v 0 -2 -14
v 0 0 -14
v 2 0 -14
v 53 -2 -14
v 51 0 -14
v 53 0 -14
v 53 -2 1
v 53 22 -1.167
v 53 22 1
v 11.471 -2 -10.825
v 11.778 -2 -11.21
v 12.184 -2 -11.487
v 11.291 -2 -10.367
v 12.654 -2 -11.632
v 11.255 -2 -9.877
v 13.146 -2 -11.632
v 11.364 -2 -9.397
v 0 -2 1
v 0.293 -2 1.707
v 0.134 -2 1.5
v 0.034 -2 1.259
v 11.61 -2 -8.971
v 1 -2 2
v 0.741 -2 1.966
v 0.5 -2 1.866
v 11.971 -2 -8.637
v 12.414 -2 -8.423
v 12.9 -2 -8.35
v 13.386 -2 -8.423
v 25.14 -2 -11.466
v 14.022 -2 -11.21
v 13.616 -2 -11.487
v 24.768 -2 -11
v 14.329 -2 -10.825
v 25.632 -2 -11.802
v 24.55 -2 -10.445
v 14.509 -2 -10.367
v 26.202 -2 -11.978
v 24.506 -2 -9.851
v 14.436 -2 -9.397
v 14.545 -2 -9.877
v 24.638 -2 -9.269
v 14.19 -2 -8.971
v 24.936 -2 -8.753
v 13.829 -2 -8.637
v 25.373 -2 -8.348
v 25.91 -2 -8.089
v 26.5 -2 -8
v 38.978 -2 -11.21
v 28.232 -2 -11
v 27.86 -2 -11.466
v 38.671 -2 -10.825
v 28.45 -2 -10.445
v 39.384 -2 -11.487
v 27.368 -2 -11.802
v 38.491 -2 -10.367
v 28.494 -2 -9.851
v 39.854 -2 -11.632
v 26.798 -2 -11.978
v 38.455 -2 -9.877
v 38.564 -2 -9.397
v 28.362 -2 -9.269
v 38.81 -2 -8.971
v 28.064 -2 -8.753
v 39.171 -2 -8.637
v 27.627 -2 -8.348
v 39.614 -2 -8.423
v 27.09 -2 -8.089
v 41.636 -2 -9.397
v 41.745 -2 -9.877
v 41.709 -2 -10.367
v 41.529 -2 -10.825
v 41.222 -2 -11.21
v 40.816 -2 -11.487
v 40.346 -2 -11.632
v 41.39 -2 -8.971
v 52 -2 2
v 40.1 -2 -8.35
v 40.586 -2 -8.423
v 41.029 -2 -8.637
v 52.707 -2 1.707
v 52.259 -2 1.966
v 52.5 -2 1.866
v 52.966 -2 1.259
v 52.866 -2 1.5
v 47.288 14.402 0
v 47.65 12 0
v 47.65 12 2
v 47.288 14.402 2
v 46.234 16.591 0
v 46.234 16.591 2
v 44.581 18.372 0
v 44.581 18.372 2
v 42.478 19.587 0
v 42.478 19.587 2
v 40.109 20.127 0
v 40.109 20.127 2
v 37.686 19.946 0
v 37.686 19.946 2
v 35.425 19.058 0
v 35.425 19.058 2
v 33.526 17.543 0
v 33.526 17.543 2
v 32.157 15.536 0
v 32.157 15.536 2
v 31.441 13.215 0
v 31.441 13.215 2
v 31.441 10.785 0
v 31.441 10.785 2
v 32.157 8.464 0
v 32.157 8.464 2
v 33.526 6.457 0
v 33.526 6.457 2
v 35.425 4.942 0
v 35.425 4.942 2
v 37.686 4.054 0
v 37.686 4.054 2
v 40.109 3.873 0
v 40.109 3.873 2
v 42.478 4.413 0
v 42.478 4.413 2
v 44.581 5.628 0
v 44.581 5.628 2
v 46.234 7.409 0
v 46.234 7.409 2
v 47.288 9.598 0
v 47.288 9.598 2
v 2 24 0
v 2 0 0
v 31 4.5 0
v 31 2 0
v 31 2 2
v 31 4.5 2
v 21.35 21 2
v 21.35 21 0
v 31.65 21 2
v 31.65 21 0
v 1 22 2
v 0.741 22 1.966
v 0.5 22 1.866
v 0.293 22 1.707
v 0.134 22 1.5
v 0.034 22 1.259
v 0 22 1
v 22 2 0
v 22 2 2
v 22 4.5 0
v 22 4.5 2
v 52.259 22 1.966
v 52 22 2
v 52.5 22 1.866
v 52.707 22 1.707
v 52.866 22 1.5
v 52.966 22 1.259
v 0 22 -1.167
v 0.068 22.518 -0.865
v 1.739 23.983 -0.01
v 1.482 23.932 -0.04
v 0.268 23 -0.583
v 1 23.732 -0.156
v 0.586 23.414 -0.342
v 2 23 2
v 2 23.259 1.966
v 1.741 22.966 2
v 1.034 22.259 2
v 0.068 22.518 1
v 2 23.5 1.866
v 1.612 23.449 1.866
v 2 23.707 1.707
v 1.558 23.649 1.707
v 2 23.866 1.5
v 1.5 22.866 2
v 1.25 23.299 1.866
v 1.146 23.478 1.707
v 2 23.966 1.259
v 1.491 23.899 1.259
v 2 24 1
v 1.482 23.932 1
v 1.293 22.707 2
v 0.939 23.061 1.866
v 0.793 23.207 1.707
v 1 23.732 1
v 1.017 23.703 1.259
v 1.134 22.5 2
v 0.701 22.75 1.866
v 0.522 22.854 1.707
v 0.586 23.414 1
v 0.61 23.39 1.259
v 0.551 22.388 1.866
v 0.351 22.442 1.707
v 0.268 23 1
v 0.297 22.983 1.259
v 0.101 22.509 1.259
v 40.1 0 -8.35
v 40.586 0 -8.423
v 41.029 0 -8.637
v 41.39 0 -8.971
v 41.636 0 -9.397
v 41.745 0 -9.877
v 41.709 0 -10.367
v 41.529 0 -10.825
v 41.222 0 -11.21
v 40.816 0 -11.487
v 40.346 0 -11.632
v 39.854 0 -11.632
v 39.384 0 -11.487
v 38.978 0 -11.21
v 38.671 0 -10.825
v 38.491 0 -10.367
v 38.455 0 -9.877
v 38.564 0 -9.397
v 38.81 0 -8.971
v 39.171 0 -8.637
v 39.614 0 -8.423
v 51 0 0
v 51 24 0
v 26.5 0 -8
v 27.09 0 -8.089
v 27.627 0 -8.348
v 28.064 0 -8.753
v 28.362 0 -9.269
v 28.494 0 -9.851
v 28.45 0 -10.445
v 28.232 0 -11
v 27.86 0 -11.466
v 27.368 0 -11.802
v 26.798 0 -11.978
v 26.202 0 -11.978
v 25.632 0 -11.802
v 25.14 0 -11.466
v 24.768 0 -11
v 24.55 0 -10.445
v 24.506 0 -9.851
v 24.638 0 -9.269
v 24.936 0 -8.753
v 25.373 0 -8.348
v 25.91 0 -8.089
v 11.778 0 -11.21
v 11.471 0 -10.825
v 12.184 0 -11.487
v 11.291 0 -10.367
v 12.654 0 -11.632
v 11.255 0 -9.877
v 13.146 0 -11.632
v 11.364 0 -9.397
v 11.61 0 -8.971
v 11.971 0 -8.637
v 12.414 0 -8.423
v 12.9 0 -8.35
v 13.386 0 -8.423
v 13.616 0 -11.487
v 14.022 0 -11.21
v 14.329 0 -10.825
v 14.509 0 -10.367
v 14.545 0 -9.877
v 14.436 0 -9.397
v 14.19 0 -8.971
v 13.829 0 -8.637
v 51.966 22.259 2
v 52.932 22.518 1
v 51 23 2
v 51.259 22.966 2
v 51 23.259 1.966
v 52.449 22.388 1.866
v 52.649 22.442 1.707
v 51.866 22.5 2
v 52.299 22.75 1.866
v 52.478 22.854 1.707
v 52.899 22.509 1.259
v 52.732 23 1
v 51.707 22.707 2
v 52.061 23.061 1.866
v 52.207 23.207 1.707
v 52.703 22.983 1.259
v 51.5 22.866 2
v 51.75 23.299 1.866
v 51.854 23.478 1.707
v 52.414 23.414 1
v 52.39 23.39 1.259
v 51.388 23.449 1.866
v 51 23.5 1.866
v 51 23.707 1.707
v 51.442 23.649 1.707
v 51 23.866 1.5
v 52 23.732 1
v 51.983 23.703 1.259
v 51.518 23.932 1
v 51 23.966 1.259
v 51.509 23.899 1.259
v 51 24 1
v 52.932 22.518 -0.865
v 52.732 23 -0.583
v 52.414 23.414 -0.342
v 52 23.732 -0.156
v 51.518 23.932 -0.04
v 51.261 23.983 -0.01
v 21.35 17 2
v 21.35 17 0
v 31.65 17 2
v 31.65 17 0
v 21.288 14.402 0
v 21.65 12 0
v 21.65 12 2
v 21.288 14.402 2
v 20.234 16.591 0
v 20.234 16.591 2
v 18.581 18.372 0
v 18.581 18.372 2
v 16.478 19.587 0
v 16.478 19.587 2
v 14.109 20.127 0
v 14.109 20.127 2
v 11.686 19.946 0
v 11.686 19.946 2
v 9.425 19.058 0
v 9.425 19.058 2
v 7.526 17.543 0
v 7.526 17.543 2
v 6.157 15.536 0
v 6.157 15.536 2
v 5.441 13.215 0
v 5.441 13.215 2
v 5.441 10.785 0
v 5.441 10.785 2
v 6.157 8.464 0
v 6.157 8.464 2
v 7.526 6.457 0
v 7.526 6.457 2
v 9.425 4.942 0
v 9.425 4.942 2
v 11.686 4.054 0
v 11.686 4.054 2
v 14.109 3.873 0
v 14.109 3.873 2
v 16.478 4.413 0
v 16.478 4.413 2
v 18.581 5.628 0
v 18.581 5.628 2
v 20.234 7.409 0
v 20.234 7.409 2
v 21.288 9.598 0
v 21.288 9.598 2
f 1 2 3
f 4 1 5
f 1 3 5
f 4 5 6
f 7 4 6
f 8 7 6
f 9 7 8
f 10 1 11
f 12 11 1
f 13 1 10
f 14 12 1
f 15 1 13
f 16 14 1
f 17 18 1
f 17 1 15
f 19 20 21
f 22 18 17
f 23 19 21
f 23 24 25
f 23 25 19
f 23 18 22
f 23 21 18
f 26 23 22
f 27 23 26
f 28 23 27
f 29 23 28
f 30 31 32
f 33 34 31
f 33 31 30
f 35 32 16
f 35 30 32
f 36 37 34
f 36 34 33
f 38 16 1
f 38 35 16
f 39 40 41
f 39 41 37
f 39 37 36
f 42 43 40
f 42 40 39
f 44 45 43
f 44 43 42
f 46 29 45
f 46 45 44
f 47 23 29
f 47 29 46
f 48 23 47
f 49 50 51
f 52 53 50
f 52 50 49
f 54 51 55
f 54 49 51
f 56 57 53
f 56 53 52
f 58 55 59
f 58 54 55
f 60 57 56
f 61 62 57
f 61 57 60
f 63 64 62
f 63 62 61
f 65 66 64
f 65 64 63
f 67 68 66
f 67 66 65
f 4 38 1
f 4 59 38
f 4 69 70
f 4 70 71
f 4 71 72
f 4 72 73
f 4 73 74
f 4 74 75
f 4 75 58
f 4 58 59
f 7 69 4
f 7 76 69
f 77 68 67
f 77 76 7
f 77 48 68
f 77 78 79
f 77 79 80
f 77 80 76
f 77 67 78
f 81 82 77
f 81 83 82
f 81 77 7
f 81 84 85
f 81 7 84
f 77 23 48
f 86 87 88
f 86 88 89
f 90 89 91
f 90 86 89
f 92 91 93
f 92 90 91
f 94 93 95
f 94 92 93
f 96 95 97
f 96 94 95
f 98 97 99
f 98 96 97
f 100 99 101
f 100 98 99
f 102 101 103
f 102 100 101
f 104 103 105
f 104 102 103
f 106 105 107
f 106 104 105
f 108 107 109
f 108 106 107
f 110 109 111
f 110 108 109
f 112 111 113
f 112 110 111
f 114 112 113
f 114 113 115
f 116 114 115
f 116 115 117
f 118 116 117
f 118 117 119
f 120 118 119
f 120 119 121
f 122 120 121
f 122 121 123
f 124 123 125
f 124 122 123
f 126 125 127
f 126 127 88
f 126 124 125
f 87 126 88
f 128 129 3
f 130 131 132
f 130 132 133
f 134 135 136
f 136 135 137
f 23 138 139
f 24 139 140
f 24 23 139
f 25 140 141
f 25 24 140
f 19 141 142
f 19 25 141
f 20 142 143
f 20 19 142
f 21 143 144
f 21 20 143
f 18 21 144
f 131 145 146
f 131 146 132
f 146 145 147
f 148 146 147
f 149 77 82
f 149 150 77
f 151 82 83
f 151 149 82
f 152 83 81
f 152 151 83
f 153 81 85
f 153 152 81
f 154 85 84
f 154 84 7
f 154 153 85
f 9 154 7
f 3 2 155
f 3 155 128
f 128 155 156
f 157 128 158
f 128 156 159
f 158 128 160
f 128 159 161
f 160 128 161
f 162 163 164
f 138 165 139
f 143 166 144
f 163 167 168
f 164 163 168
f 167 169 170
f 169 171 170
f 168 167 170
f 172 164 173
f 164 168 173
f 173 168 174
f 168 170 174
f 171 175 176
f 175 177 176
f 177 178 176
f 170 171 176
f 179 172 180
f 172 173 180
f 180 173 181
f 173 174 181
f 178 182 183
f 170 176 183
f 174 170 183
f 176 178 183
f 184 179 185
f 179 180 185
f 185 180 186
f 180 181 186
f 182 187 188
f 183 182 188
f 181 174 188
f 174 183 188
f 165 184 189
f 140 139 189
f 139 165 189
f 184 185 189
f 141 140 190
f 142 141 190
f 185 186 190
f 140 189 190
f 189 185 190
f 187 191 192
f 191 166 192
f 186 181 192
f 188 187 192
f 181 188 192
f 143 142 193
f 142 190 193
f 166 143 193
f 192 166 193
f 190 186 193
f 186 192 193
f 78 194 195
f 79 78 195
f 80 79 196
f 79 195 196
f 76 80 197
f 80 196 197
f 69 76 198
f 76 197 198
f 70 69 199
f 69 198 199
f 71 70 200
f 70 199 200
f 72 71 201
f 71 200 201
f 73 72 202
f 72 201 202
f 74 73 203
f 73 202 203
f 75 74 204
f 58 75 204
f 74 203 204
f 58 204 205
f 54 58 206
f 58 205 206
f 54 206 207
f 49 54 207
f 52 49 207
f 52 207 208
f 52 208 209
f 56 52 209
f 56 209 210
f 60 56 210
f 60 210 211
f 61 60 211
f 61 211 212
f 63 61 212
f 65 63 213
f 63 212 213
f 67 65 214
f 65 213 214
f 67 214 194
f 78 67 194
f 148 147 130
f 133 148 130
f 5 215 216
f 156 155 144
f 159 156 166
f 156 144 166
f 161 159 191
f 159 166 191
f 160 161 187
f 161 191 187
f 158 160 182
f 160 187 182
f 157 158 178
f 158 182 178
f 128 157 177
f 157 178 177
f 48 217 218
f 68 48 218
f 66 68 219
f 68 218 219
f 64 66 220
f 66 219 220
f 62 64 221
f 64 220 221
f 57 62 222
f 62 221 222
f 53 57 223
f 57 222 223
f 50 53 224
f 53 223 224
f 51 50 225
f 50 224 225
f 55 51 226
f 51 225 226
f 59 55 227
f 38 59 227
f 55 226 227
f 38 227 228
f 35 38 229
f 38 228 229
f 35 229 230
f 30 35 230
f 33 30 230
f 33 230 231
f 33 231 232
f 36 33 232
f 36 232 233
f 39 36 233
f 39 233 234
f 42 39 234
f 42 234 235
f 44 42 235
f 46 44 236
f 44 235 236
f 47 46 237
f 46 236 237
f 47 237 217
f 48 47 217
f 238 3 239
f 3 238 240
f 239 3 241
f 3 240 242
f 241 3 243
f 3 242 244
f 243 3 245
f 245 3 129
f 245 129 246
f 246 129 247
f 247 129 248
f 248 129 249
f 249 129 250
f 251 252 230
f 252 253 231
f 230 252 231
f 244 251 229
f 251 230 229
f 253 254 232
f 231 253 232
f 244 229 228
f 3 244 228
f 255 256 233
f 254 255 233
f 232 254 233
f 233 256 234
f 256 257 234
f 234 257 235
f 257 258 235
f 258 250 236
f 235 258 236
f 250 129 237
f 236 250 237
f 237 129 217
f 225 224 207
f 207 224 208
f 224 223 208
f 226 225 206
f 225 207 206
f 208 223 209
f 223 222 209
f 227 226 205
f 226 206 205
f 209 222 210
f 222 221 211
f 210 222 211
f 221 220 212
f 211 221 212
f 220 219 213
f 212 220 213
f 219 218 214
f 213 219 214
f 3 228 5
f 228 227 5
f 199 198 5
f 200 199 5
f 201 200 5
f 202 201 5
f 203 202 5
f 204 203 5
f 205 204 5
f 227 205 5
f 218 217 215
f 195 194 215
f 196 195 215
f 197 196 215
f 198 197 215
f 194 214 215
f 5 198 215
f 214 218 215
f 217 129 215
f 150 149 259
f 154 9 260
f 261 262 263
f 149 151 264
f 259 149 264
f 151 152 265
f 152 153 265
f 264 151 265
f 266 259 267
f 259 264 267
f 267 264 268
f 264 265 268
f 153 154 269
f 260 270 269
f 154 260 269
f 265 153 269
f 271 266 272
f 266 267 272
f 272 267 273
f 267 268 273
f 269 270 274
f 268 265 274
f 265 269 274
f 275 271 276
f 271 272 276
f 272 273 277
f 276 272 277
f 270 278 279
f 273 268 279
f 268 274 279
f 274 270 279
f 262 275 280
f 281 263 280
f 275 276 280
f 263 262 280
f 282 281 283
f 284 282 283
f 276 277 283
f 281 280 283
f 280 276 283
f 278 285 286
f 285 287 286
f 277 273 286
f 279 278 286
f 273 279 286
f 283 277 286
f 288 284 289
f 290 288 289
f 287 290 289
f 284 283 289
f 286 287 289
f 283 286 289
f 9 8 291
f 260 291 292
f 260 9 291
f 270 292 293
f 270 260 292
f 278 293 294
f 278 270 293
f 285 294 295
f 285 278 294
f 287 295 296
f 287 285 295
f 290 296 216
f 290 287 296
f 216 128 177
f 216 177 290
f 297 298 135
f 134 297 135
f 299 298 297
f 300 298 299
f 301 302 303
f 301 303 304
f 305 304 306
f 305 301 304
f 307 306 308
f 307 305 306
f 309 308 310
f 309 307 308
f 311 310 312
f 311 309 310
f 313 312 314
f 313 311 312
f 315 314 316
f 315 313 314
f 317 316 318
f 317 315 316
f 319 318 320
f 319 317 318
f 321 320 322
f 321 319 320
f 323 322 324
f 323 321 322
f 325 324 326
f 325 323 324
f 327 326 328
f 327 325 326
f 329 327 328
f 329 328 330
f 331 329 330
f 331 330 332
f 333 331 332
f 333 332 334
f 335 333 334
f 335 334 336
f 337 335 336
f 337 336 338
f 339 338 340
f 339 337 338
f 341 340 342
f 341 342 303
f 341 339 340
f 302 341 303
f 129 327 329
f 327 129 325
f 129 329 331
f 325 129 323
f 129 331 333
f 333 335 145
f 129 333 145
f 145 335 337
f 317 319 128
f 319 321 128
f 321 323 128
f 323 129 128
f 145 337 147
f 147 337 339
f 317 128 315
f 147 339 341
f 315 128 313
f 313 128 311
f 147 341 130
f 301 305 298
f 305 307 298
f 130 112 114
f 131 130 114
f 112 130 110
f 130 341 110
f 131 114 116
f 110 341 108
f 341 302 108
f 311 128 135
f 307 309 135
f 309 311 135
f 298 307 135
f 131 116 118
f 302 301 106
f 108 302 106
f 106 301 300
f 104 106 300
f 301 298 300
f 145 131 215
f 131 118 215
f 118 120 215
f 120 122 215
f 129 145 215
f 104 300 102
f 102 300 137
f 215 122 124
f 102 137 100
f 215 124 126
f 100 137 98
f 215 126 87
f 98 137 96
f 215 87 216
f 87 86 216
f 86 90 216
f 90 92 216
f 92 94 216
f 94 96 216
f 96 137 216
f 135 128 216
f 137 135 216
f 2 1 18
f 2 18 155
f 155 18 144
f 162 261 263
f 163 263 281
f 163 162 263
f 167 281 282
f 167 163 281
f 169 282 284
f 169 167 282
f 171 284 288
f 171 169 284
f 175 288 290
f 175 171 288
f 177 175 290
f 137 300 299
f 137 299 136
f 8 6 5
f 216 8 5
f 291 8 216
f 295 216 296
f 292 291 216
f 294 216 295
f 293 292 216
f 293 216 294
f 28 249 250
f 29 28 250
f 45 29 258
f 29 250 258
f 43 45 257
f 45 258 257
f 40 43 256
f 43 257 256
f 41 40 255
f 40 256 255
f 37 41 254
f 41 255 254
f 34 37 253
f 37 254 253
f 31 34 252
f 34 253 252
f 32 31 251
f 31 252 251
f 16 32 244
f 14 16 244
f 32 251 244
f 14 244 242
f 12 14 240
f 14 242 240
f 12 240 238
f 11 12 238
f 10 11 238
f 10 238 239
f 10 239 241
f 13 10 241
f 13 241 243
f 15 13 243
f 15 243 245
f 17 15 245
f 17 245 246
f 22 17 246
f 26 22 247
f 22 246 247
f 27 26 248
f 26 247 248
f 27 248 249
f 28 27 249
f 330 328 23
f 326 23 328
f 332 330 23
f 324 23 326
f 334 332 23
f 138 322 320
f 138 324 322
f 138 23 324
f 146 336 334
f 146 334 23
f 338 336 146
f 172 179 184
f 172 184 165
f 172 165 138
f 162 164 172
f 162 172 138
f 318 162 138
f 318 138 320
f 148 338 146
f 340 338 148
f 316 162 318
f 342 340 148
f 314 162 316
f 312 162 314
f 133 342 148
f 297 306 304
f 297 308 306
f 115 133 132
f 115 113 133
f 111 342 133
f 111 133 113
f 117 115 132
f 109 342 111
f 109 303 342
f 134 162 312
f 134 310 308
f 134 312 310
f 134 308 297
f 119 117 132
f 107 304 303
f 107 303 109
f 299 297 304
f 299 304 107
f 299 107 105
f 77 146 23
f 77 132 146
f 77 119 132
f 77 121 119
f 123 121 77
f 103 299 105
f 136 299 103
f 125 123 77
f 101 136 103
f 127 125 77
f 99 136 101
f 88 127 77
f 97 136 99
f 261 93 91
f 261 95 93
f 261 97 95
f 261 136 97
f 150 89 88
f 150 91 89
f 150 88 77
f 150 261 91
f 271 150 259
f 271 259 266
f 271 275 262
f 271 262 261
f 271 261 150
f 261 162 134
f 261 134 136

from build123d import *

# Parameters (mm, degrees)
CROQUIS1_W              = 53
CROQUIS1_H              = 24
CROQUIS1_R              = 8.15
CROQUIS1_W_2            = 10.3
CROQUIS1_H_2            = 4
CROQUIS1_W_3            = 9
CROQUIS1_H_3            = 2.5
SALIENTE_EXTRUIR1_DEPTH = 2
CROQUIS2_W              = 53
CROQUIS2_H              = 2
SALIENTE_EXTRUIR2_DEPTH = 16
SALIENTE_EXTRUIR3_DEPTH = 2
SALIENTE_EXTRUIR5_START = -53
SALIENTE_EXTRUIR5_DEPTH = 2
CROQUIS5_R              = 1.65
CROQUIS5_R_2            = 2
CORTAR_EXTRUIR1_DEPTH   = 2
REDONDEO1_R             = 2
REDONDEO6_R             = 1


with BuildPart() as part:
    # Croquis1 → Saliente-Extruir1 (new body)
    with BuildSketch(Plane.XY):
        with Locations((26.5, 12)):
            Rectangle(CROQUIS1_W, CROQUIS1_H)
        with Locations((13.5, 12)):
            Circle(CROQUIS1_R, mode=Mode.SUBTRACT)
        with Locations((39.5, 12)):
            Circle(CROQUIS1_R, mode=Mode.SUBTRACT)
        with Locations((26.5, 19)):
            Rectangle(CROQUIS1_W_2, CROQUIS1_H_2, mode=Mode.SUBTRACT)
        with Locations((26.5, 3.25)):
            Rectangle(CROQUIS1_W_3, CROQUIS1_H_3, mode=Mode.SUBTRACT)
    extrude(amount=SALIENTE_EXTRUIR1_DEPTH)

    # Croquis2 → Saliente-Extruir2 (add)
    with BuildSketch(Plane.XY.offset(2)):
        with Locations((26.5, -1)):
            Rectangle(CROQUIS2_W, CROQUIS2_H)
    extrude(amount=-SALIENTE_EXTRUIR2_DEPTH)

    # Croquis4 → Saliente-Extruir3 (add)
    with BuildSketch(Plane(origin=(53, 0, 0), x_dir=(0, 0, -1), z_dir=(1, 0, 0))):
        Polygon((14, -2), (14, 0), (0, 24), (-2, 24), (-2, -2), align=None)
    extrude(amount=-SALIENTE_EXTRUIR3_DEPTH)

    # Croquis4<3> → Saliente-Extruir5 (add)
    with BuildSketch(Plane(origin=(53, 0, 0), x_dir=(0, 0, -1), z_dir=(1, 0, 0)).offset(SALIENTE_EXTRUIR5_START)):
        Polygon((14, -2), (14, 0), (0, 24), (-2, 24), (-2, -2), align=None)
    extrude(amount=SALIENTE_EXTRUIR5_DEPTH)

    # Croquis5 → Cortar-Extruir1 (cut)
    with BuildSketch(Plane(origin=(0, 0, 0), x_dir=(1, 0, 0), z_dir=(0, 1, 0))):
        with Locations(Location((12.9, 10, 0), (0, 0, 270))):
            Circle(CROQUIS5_R)
        with Locations(Location((40.1, 10, 0), (0, 0, 270))):
            Circle(CROQUIS5_R)
        with Locations(Location((26.5, 10, 0), (0, 0, 270))):
            Circle(CROQUIS5_R_2)
    extrude(amount=-CORTAR_EXTRUIR1_DEPTH, mode=Mode.SUBTRACT)

    # Redondeo1
    redondeo1_edges = [part.edges().sort_by_distance(p)[0] for p in [
        (0, 24, 1),
        (53, 24, 1),
    ]]
    fillet(redondeo1_edges, radius=REDONDEO1_R)

    # Redondeo6
    redondeo6_edges = [part.edges().sort_by_distance(p)[0] for p in [
        (53, 10, 2),
        (0, 10, 2),
        (26.5, 24, 2),
        (52.414213562, 23.414213562, 2),
        (0.585786438, 23.414213562, 2),
    ]]
    fillet(redondeo6_edges, radius=REDONDEO6_R)


solid = part.part
